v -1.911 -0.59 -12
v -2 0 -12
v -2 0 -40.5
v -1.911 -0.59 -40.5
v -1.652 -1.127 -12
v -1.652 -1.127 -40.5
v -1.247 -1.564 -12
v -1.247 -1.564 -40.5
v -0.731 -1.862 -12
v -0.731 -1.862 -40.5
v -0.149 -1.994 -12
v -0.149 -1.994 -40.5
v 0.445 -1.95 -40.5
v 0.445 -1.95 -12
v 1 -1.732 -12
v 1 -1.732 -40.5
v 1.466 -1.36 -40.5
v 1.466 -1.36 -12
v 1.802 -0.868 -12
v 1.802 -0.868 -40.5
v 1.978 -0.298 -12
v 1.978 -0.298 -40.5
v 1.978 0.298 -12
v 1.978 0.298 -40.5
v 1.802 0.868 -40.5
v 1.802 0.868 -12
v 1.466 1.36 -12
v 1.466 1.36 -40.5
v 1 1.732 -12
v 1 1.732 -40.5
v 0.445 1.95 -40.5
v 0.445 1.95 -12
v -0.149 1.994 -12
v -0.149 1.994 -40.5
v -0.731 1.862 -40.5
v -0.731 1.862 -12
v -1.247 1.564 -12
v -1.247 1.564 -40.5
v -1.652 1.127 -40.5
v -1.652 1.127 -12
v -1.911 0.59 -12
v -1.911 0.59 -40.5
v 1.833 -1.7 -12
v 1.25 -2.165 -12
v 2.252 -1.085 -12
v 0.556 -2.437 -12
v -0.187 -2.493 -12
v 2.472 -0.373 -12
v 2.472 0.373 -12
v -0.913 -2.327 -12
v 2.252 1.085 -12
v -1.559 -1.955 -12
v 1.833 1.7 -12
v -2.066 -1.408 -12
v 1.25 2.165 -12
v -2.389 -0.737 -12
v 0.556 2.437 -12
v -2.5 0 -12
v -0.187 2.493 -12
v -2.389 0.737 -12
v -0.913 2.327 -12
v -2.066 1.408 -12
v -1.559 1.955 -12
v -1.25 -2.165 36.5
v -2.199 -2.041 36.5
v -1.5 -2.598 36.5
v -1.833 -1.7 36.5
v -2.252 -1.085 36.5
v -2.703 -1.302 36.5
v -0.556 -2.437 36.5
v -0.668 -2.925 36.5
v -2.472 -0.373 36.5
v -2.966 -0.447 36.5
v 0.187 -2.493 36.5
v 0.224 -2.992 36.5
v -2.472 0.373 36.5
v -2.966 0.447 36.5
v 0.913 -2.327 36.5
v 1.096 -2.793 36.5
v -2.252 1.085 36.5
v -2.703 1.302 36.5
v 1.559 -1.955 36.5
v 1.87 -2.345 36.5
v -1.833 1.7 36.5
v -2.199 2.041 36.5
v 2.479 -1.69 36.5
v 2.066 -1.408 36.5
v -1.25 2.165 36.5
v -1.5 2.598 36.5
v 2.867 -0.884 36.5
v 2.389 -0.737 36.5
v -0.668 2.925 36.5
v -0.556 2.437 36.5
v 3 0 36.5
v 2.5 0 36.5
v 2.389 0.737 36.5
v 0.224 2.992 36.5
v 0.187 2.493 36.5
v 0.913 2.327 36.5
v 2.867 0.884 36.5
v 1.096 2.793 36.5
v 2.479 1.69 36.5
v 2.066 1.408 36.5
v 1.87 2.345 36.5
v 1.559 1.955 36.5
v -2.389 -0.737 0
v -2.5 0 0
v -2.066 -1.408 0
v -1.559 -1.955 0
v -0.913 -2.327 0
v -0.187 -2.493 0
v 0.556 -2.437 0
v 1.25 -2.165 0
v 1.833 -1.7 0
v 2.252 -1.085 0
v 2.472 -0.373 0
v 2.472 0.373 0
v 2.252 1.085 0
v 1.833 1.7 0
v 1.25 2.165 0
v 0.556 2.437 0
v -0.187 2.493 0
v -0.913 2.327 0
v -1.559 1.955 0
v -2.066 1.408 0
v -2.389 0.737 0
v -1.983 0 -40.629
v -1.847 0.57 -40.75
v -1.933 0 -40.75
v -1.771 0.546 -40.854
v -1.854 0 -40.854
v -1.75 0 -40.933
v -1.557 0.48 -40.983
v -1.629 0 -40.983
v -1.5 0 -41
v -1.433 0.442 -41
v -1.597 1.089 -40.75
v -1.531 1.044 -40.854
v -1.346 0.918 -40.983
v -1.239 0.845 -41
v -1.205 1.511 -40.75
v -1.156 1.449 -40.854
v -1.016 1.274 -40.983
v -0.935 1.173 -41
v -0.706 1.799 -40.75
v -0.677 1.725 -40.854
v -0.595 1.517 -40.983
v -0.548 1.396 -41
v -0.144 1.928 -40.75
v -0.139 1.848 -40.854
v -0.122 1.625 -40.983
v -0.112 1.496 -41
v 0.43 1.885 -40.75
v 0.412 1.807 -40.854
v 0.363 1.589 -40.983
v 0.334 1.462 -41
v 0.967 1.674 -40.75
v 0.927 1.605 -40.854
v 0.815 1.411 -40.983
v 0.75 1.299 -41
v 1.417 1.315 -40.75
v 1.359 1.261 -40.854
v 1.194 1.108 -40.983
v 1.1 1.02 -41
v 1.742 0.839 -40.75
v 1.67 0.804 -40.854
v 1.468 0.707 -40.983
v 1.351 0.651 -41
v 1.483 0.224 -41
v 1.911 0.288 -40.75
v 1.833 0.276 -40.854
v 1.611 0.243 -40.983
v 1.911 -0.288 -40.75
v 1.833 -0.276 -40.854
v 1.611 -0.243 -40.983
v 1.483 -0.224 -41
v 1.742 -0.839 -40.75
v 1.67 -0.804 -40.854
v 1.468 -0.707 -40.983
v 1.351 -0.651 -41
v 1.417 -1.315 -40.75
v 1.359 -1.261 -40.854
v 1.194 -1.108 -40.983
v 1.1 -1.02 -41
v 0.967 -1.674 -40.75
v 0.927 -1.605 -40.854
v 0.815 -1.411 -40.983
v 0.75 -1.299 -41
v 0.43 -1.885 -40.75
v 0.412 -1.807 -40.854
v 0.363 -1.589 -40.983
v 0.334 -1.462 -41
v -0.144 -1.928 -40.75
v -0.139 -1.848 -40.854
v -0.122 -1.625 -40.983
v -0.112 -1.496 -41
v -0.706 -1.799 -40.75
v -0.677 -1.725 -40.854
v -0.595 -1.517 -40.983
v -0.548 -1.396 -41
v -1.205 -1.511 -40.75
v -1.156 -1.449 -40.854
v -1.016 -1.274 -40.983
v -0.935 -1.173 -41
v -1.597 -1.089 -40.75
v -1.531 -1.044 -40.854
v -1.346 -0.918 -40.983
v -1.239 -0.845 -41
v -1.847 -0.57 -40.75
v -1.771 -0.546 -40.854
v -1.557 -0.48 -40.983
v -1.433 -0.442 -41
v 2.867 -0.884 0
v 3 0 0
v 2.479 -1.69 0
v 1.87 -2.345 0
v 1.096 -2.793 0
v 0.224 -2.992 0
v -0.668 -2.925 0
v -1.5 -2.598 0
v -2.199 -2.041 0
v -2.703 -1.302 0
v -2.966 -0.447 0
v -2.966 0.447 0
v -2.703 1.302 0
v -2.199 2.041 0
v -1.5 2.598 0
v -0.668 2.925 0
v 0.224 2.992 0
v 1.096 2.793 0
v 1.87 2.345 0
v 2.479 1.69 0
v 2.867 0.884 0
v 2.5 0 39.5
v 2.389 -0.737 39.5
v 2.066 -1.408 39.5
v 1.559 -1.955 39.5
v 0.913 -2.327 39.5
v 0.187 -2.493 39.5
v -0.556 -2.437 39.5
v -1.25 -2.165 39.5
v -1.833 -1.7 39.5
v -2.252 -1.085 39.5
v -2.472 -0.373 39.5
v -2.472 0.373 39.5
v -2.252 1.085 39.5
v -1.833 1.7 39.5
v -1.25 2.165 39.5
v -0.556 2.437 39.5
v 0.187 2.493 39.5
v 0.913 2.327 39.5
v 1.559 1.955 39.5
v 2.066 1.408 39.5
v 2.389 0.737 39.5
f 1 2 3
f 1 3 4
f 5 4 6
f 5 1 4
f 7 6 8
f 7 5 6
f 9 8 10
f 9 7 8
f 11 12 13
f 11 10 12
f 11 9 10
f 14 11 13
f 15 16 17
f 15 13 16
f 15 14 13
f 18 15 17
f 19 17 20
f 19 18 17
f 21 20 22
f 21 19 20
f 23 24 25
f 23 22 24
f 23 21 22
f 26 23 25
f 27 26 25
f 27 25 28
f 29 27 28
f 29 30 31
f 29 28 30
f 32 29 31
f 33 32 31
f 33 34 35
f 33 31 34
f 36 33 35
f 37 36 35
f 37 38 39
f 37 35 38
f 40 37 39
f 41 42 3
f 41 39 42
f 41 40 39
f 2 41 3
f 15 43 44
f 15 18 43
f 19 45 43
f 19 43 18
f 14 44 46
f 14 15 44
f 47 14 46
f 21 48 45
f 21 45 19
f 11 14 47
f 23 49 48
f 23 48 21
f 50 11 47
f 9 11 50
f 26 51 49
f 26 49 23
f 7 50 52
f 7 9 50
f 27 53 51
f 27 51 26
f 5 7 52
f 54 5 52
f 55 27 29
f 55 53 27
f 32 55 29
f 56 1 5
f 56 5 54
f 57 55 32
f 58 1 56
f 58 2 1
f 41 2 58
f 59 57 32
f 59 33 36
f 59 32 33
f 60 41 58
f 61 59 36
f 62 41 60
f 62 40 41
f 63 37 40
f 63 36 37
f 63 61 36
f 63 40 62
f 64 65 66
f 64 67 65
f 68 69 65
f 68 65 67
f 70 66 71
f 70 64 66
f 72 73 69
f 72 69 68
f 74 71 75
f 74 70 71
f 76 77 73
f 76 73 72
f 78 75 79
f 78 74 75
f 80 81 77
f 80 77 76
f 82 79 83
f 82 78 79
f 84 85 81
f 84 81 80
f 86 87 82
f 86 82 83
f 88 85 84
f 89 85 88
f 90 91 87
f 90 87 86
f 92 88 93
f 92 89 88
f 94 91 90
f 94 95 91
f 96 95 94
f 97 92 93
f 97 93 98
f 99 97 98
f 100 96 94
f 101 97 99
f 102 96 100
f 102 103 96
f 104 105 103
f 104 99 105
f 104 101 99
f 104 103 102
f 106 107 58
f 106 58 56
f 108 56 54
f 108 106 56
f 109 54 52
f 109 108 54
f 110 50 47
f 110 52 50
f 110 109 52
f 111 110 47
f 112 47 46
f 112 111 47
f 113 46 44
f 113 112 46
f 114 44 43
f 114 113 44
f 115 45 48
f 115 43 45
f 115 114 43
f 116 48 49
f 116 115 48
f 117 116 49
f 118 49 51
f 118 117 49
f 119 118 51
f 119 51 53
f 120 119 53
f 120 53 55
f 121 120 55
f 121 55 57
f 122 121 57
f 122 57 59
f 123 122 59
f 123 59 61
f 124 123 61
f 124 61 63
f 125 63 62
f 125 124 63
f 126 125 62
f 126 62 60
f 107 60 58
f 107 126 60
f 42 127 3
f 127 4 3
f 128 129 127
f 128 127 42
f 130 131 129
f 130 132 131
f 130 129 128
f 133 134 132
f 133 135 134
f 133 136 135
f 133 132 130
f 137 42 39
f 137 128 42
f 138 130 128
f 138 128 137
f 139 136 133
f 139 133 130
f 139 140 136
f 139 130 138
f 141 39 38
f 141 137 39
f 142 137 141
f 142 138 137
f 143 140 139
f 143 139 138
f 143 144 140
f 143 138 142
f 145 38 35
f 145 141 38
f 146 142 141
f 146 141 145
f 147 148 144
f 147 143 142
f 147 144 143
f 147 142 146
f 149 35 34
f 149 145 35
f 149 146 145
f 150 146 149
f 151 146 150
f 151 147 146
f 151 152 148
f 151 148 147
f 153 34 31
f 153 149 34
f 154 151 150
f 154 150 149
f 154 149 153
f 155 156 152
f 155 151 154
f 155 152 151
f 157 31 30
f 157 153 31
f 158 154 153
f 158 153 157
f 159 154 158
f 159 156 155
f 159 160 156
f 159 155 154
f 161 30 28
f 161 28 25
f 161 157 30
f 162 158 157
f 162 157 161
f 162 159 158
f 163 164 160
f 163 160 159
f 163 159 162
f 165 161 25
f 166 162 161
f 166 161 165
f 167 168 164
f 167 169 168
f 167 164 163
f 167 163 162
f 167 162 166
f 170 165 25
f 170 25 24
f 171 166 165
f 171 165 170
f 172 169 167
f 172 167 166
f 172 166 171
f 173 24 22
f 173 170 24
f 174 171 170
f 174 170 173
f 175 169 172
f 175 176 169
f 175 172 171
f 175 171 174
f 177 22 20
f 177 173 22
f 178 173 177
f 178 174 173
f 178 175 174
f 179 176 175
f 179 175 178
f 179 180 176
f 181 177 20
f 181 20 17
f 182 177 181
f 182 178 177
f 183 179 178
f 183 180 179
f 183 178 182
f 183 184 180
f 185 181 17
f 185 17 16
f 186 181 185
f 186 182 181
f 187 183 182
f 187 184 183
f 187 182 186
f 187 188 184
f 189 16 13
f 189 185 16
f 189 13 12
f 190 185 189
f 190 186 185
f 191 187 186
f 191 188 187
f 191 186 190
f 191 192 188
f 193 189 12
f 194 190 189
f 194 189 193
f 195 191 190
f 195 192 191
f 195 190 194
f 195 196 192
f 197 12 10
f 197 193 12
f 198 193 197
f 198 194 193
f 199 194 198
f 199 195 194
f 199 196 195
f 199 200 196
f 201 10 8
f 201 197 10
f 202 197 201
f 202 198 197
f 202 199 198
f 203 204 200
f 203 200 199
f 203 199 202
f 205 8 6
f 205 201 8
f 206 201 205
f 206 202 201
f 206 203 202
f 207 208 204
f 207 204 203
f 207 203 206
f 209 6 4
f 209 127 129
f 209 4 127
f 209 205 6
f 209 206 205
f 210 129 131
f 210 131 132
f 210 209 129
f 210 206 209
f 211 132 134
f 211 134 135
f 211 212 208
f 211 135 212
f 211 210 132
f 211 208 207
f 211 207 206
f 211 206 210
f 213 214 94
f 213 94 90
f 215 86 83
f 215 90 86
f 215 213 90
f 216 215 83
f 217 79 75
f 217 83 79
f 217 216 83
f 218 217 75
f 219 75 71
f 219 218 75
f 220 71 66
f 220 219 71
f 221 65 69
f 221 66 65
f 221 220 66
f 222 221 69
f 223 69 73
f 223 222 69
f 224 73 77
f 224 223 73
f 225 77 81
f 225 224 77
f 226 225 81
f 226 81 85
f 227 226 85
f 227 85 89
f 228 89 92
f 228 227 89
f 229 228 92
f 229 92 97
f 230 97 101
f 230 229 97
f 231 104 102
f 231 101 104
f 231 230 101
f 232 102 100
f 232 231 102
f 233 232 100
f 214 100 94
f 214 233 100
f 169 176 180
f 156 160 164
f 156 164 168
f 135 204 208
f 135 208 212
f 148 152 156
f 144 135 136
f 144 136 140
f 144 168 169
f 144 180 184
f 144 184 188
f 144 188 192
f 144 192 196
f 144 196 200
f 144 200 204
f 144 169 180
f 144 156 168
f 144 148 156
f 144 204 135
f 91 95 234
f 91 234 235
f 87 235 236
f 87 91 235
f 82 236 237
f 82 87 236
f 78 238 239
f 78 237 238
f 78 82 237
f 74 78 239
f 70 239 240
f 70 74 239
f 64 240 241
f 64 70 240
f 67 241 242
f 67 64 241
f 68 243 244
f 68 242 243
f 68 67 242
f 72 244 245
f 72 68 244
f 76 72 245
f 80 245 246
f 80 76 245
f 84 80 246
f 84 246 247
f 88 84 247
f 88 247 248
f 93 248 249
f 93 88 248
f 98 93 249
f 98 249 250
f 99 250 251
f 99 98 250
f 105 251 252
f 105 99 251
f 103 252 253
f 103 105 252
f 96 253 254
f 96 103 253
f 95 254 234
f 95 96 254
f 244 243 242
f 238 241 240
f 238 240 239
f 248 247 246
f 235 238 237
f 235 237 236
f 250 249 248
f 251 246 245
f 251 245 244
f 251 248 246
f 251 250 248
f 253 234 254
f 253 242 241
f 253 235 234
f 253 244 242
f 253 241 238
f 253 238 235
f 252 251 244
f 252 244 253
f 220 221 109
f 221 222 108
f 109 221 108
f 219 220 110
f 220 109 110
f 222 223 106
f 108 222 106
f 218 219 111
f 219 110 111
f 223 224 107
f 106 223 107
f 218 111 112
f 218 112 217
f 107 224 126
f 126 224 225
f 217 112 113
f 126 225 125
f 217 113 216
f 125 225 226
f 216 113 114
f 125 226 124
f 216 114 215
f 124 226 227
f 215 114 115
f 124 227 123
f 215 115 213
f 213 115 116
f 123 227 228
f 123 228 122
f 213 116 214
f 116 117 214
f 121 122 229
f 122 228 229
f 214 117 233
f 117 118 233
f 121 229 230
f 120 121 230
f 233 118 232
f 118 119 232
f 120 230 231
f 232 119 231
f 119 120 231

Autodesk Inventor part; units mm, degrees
ref_plane "YZ Plane" through (0, 0, 0) normal (1, 0, 0) x (0, 1, 0)
ref_plane "XZ Plane" through (0, 0, 0) normal (0, 1, 0) x (-1, 0, 0)
ref_plane "XY Plane" through (0, 0, 0) normal (0, 0, 1) x (1, 0, 0)
sketch "Esquisse1" plane through (0, 0, 0) normal (0, 0, 1) x (1, 0, 0)
  circle A0 centre (0, 0) radius 3
  dimension "d0" = 6
extrude "Extrusion1" add sketch "Esquisse1" along normal blind 36.5
sketch "Esquisse2" plane through (0, 0, 36.5) normal (0, 0, 1) x (1, 0, 0)
  circle A0 centre (0, 0) radius 2.5
  dimension "d3" = 5
extrude "Extrusion2" add sketch "Esquisse2" along normal blind 3
sketch "Esquisse3" plane through (0, 0, 0) normal (0, 0, -1) x (-1, 0, 0)
  circle A0 centre (0, 0) radius 2.5
  dimension "d6" = 5
extrude "Extrusion3" add sketch "Esquisse3" along normal blind 12
sketch "Esquisse4" plane through (0, 0, -12) normal (0, 0, -1) x (-1, 0, 0)
  circle A0 centre (0, 0) radius 2
  dimension "d9" = 4
extrude "Extrusion4" add sketch "Esquisse4" along normal blind 29
thread "Filetage1" size "M4x0.7" class "6g" standard "ANSI Metric M Profile" length 9
fillet "Congé1" radius 0.5 1 edges at (2, 0, -41)
properties part number "AxeArriere" material "Acier inoxydable"
